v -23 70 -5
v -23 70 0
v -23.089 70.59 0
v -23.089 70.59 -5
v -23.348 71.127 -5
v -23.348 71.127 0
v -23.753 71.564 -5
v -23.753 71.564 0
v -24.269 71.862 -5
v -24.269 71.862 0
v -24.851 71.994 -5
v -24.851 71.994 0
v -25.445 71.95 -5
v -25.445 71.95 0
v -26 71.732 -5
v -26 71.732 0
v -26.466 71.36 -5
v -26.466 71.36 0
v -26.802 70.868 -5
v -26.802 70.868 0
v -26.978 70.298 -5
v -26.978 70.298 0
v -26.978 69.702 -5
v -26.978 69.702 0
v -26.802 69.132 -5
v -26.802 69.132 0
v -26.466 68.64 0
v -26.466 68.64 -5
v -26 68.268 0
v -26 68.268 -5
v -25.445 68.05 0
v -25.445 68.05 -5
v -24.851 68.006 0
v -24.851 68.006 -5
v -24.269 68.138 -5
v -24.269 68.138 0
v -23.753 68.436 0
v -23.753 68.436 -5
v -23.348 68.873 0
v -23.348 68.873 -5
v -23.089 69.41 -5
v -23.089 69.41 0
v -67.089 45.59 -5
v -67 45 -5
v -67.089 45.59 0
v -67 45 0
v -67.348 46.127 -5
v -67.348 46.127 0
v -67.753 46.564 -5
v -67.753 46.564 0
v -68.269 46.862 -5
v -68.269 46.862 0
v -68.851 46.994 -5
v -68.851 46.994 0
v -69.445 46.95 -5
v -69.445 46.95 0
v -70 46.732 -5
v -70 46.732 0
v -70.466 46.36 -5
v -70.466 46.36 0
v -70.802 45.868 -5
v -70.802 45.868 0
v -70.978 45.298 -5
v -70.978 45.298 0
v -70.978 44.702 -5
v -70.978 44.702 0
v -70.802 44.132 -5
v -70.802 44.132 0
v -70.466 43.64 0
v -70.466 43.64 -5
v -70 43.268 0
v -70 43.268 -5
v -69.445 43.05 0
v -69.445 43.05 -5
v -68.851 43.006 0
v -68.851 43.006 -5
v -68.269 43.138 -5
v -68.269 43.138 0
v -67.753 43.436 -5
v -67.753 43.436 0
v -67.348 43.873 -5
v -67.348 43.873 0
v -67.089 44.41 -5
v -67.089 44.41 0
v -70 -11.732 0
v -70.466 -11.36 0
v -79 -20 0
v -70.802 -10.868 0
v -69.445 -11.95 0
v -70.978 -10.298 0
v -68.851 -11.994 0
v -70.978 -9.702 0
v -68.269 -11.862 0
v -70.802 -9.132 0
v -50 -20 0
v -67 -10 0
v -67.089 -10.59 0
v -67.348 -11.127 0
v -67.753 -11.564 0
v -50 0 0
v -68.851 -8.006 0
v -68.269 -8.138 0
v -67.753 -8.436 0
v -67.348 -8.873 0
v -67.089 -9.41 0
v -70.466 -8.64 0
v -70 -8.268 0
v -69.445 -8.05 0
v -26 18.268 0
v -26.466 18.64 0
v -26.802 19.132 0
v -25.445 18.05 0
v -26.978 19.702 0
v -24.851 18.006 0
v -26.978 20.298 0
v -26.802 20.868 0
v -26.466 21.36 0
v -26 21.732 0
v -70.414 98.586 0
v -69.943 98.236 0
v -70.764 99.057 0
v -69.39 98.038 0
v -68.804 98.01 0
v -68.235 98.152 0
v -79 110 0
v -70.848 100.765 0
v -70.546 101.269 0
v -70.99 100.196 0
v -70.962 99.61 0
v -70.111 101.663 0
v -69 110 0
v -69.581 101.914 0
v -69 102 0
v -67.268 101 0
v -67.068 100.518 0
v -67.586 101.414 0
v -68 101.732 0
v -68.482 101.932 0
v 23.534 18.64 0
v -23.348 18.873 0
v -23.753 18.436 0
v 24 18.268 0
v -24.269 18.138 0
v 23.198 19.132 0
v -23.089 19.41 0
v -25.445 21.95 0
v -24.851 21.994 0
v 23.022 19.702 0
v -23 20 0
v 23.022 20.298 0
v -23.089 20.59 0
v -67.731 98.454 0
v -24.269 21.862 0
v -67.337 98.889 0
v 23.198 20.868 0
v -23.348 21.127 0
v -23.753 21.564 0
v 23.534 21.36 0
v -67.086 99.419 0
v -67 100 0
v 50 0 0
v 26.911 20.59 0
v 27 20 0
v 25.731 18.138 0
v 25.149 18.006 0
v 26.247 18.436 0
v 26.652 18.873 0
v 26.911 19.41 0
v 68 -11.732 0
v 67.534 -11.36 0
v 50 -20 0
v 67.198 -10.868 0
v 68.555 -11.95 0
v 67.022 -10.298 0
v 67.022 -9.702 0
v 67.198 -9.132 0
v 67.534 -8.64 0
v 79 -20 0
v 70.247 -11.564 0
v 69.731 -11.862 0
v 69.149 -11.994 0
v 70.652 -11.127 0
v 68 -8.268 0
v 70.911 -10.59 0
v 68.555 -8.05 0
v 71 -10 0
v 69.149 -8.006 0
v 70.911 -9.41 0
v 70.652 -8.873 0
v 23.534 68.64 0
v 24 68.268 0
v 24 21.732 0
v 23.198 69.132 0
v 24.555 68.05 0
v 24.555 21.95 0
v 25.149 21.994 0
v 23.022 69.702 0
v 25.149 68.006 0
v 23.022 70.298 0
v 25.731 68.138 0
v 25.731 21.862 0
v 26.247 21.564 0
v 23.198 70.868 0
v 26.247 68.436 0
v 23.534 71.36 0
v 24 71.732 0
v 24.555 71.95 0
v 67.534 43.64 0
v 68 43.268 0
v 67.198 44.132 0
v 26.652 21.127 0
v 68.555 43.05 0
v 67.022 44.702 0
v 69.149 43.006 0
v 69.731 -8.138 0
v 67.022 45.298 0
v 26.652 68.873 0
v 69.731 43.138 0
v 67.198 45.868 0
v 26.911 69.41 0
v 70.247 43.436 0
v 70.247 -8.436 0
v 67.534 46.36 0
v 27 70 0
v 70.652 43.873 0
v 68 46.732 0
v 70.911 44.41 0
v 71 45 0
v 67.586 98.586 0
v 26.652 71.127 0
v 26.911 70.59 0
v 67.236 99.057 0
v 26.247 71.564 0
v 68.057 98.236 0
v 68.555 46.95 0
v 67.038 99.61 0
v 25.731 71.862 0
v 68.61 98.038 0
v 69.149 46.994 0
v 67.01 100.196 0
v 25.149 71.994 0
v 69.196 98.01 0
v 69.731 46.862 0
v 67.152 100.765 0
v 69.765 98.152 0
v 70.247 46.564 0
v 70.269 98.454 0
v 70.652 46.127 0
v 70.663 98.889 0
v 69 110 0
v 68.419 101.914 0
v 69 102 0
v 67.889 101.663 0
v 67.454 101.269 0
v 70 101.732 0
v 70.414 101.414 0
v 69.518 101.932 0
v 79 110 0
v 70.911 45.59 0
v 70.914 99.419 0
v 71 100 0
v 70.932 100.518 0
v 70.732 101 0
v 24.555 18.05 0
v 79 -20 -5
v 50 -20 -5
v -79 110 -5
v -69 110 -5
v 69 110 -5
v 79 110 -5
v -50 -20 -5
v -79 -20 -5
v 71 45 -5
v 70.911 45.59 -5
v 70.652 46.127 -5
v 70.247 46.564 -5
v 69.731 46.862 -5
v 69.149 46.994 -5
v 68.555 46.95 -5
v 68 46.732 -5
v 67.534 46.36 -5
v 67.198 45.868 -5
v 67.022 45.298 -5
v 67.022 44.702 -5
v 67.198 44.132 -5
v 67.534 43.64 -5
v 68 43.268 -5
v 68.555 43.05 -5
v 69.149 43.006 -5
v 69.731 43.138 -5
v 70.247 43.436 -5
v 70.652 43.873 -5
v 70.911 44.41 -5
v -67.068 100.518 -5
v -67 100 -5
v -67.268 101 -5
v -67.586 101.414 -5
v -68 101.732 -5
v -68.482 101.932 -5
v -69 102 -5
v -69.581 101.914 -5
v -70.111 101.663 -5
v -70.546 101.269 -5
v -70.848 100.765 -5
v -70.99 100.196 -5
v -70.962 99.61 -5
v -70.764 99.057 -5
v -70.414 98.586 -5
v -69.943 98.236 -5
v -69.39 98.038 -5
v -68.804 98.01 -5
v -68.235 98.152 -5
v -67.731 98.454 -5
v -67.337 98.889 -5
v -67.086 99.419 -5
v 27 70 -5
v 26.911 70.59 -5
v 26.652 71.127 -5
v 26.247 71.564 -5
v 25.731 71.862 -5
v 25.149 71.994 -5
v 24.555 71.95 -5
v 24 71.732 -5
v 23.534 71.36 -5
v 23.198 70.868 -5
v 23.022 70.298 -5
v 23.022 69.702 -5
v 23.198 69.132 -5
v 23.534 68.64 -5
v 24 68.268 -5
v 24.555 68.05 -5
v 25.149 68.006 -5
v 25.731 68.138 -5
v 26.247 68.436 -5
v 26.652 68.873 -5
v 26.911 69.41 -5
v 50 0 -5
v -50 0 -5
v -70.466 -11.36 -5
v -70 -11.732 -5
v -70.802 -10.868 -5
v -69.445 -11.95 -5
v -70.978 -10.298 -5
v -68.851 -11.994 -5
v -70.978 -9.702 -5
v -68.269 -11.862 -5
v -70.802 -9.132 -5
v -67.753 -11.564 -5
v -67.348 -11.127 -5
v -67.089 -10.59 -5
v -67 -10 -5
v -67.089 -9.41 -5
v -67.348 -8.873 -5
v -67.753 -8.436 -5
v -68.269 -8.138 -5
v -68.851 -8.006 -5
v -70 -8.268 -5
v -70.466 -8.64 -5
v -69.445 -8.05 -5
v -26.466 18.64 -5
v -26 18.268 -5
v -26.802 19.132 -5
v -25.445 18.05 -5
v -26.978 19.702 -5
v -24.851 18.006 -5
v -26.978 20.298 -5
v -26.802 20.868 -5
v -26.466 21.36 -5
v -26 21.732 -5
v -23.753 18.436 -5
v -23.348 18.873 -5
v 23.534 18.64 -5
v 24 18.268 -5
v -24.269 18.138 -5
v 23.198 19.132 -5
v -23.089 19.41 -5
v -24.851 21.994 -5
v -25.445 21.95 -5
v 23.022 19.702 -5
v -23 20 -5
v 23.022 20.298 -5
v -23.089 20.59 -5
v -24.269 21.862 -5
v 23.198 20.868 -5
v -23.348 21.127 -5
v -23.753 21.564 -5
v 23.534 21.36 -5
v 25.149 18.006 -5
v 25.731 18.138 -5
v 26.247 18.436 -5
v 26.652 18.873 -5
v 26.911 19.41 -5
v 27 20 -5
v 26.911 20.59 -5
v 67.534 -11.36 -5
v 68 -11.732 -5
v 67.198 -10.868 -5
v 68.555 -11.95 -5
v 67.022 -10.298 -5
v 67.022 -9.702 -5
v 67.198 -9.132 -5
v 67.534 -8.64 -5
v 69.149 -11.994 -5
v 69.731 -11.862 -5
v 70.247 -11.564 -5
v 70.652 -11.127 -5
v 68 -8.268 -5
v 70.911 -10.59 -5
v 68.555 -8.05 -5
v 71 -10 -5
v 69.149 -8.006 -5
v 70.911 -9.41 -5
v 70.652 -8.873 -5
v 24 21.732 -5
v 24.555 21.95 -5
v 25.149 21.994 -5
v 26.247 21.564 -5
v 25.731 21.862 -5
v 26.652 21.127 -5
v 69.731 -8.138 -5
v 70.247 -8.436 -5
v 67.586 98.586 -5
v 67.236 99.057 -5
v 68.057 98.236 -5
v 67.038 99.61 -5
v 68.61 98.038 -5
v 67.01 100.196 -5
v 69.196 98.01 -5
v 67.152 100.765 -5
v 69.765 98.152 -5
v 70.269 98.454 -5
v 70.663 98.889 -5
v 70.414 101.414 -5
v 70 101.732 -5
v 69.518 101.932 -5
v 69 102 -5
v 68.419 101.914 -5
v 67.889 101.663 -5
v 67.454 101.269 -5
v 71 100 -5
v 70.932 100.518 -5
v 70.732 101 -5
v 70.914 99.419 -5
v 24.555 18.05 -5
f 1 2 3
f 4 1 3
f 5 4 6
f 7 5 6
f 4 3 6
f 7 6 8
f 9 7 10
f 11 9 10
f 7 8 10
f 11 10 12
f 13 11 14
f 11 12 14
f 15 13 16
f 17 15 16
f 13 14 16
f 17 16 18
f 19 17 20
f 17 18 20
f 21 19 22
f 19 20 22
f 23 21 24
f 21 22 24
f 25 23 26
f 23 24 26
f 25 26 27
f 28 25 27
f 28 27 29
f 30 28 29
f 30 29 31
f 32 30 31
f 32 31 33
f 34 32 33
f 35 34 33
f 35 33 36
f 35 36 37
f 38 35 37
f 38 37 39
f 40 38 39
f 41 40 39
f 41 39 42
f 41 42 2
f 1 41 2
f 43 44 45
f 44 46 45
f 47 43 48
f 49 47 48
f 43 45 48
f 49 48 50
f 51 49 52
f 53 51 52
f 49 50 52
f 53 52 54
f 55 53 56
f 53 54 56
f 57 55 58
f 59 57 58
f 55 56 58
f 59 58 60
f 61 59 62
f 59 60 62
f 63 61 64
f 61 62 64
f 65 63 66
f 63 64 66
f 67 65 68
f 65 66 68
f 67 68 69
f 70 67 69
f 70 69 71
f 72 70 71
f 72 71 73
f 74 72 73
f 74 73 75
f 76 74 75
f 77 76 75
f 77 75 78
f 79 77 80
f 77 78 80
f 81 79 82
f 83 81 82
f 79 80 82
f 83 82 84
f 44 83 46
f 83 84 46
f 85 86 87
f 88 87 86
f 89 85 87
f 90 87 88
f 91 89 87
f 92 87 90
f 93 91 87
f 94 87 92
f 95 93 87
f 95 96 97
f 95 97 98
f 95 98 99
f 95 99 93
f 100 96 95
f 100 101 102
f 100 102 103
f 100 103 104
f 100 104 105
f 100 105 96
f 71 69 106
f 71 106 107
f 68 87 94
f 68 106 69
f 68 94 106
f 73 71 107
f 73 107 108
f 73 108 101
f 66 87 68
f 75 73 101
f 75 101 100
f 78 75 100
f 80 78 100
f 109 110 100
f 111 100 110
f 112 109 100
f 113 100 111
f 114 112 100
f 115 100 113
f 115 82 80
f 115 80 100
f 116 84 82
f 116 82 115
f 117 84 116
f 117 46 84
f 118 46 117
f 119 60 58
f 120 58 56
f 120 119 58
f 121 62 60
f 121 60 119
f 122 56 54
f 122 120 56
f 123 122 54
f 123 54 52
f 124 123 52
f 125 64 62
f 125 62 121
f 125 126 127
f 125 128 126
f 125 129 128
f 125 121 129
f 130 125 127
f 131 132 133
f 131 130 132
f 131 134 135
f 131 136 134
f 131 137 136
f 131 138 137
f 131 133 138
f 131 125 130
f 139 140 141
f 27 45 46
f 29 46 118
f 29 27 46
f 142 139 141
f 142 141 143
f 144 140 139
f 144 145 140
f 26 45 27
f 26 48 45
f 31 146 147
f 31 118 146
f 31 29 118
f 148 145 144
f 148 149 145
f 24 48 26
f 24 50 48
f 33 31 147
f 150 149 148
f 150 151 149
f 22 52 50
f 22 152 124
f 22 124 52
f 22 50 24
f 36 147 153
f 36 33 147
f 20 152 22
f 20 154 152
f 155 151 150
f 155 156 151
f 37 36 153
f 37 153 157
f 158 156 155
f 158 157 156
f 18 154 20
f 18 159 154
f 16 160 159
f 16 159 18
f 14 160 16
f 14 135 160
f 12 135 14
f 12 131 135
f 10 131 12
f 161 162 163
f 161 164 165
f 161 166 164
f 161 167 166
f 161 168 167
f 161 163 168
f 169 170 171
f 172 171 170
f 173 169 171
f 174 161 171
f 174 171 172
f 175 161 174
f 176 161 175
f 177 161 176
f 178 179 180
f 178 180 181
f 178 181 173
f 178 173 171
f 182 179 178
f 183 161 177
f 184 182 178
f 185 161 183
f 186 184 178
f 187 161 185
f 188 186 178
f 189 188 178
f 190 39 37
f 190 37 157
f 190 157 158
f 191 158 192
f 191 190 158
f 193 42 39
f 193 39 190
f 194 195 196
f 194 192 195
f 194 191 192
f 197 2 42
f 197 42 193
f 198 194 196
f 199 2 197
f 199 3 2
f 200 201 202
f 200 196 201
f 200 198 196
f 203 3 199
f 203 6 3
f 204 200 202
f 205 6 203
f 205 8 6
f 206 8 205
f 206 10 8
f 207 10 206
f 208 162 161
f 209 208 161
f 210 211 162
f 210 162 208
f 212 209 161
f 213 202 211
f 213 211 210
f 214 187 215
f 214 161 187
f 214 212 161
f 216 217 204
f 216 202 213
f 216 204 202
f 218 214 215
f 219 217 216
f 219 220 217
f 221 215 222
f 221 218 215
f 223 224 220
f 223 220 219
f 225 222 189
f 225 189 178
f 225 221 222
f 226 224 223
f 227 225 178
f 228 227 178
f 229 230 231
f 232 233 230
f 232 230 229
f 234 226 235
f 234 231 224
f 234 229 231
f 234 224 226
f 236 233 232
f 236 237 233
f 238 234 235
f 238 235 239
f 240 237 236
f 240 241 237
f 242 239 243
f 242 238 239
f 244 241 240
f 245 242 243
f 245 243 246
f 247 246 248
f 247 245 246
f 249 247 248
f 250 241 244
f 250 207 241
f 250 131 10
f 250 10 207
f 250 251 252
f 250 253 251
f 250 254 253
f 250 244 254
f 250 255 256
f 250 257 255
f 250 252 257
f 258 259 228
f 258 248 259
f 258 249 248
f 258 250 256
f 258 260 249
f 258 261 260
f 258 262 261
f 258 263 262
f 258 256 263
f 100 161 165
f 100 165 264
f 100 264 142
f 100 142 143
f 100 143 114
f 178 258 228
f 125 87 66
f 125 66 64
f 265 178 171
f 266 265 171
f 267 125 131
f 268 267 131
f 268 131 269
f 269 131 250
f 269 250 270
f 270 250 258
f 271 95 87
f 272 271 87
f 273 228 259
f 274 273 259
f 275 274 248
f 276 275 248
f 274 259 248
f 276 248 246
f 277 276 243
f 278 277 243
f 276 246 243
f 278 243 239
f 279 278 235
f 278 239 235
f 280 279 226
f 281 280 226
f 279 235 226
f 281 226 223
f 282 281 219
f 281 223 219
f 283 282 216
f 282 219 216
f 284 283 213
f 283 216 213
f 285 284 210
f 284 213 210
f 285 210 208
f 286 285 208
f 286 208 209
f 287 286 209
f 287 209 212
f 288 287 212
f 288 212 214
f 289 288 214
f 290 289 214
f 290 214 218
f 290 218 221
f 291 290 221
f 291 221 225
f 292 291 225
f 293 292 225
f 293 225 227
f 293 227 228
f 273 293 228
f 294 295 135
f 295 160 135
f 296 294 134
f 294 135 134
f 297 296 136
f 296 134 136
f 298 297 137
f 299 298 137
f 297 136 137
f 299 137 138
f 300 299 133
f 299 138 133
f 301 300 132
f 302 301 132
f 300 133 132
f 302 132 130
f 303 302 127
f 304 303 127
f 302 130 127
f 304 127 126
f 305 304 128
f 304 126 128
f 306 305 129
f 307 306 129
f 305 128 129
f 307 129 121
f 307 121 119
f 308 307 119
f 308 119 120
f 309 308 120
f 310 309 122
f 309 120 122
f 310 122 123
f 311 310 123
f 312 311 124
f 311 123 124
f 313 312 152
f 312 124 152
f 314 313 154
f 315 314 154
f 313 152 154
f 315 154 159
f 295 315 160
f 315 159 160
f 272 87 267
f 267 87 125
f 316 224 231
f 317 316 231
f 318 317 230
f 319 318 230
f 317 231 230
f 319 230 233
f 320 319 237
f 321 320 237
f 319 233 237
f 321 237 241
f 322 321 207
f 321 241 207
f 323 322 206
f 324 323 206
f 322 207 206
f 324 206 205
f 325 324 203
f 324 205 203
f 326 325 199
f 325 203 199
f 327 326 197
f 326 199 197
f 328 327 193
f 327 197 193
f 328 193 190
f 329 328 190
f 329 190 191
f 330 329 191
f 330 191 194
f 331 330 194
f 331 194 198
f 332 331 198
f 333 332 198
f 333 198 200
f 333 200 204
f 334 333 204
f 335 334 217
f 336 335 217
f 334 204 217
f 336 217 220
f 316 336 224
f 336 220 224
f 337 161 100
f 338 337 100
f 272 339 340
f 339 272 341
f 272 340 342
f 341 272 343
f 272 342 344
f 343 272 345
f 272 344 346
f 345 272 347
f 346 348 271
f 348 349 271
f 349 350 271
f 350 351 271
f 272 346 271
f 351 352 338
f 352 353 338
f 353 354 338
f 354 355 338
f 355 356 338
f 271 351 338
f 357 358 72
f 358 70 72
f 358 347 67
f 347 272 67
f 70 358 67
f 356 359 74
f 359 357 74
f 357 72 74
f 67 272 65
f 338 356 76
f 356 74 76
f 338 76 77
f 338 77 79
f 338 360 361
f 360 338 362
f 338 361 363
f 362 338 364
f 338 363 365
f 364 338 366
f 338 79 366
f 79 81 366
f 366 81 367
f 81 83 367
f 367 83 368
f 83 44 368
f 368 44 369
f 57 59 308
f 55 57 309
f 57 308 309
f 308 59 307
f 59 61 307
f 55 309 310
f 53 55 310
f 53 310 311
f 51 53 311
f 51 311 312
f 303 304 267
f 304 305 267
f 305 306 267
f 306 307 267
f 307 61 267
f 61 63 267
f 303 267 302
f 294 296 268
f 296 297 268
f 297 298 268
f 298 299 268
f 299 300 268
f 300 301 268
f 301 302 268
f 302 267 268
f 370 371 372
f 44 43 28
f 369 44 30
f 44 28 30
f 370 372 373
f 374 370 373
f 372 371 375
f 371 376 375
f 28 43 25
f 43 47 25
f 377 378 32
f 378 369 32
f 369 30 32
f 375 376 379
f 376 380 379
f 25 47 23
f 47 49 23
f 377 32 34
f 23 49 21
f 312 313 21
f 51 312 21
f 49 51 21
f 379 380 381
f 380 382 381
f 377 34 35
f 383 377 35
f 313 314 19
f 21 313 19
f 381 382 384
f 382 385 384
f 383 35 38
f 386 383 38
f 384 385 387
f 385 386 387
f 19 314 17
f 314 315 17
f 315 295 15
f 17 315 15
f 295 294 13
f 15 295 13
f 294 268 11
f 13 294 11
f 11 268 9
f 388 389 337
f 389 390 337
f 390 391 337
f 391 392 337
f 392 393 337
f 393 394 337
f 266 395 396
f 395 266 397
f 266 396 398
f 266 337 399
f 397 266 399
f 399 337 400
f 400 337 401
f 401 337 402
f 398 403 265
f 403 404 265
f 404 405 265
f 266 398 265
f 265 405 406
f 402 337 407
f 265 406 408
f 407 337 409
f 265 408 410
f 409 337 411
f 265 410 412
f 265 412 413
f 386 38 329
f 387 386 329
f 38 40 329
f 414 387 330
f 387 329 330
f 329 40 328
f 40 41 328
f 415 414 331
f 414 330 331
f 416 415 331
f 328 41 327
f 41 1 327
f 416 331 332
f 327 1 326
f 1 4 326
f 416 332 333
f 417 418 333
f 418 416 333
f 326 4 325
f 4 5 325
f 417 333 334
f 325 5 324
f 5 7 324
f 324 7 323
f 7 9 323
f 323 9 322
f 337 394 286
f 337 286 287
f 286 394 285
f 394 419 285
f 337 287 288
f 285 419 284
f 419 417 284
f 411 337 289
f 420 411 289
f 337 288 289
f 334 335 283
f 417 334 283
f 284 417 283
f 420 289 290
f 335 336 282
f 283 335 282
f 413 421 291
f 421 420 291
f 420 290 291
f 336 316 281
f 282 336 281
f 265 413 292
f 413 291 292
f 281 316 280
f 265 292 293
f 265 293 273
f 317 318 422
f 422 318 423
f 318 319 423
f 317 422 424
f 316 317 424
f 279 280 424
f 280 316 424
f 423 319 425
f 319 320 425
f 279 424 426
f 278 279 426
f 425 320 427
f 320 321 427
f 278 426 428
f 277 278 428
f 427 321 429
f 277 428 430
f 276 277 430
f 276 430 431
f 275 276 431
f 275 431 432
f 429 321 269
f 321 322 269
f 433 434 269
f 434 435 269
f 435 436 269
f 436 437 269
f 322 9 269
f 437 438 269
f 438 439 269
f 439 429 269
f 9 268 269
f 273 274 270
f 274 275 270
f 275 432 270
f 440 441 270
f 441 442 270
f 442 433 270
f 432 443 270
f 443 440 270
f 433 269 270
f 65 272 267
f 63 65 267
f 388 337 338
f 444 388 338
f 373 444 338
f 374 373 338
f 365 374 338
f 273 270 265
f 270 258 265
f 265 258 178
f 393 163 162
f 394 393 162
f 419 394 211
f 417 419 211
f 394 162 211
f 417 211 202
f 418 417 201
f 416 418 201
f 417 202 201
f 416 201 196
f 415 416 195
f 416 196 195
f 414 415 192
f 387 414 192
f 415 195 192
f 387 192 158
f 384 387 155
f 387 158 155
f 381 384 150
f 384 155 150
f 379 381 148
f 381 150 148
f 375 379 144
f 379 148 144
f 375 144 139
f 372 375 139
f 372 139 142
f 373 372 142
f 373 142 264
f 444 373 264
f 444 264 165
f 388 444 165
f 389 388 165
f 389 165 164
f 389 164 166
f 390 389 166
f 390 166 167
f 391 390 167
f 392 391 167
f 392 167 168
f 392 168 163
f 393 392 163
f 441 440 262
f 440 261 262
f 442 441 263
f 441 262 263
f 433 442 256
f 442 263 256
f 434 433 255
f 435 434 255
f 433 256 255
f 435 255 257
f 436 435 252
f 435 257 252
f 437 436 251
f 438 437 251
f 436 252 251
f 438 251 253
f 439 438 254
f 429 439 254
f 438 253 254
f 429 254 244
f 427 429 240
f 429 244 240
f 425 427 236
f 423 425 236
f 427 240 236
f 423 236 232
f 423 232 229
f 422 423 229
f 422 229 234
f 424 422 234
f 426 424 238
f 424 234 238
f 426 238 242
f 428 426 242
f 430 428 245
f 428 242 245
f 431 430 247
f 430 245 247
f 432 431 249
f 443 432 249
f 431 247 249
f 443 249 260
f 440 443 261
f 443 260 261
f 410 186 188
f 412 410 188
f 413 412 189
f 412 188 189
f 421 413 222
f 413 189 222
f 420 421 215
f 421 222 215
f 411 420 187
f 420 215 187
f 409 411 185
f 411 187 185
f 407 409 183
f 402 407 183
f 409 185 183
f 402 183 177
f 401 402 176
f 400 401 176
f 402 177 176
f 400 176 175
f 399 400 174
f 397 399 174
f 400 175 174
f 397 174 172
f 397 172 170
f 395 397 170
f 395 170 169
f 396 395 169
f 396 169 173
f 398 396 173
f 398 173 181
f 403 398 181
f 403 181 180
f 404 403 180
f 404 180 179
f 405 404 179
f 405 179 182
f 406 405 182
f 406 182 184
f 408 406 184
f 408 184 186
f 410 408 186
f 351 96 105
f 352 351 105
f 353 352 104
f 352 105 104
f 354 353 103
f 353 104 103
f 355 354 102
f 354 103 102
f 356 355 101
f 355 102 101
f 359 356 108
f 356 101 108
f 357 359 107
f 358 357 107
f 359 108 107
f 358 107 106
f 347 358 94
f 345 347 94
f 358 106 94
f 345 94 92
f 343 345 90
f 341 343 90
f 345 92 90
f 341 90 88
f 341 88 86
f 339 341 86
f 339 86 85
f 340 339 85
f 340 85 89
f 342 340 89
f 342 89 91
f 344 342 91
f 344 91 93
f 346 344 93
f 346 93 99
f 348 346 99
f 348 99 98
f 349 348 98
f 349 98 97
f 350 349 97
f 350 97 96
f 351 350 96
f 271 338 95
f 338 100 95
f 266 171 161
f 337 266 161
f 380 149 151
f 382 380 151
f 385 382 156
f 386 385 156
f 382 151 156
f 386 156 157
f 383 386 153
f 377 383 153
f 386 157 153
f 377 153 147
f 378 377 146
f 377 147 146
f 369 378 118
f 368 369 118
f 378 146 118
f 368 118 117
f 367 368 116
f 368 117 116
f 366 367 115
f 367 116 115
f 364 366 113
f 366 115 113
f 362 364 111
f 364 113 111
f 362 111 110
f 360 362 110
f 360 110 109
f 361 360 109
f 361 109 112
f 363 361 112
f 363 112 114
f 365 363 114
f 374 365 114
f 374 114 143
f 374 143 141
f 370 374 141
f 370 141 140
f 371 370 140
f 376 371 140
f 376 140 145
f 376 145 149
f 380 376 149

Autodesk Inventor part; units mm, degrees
ref_plane "YZ Plane" through (0, 0, 0) normal (1, 0, 0) x (0, 1, 0)
ref_plane "XZ Plane" through (0, 0, 0) normal (0, 1, 0) x (-1, 0, 0)
ref_plane "XY Plane" through (0, 0, 0) normal (0, 0, 1) x (1, 0, 0)
sketch "Esquisse1" plane through (0, 0, 0) normal (0, 0, 1) x (1, 0, 0)
  line L0 (0, 0) -> (-50, 0)
  line L1 (-50, 0) -> (-50, -20)
  line L2 (-50, -20) -> (-79, -20)
  line L3 (-79, -20) -> (-79, 110)
  line L4 (-79, 110) -> (79, 110)
  line L5 (79, 110) -> (79, -20)
  line L6 (79, -20) -> (50, -20)
  line L7 (50, -20) -> (50, 0)
  line L8 (50, 0) -> (0, 0)
  line L9 (-69, 110) -> (-69, 100)
  line L10 (-69, 100) -> (-69, 45) construction
  line L11 (-69, 45) -> (-69, -10) construction
  line L12 (-69, -10) -> (-69, -20)
  line L13 (69, -20) -> (69, -10)
  line L14 (69, -10) -> (69, 45) construction
  line L15 (69, 45) -> (69, 100) construction
  line L16 (69, 100) -> (69, 110)
  circle A0 centre (-69, 100) radius 2
  circle A1 centre (69, 100) radius 2
  circle A2 centre (69, 45) radius 2
  circle A3 centre (-69, 45) radius 2
  circle A4 centre (-69, -10) radius 2
  circle A5 centre (69, -10) radius 2
  line L17 (-69, -10) -> (-79, -10)
  line L18 (69, -10) -> (79, -10)
  line L19 (25, 70) -> (-25, 70) construction
  line L20 (-25, 70) -> (-25, 20) construction
  line L21 (-25, 20) -> (25, 20) construction
  line L22 (25, 20) -> (25, 70) construction
  line L23 (25, 70) -> (-25, 20) construction
  line L24 (-25, 70) -> (25, 20) construction
  line L25 (-69, 45) -> (69, 45) construction
  circle A6 centre (-25, 70) radius 2
  circle A7 centre (25, 70) radius 2
  circle A8 centre (25, 20) radius 2
  circle A9 centre (-25, 20) radius 2
  point P0 (0, 45)
  dimension "d0" = 130
  dimension "d1" = 110
  dimension "d2" = 100
  dimension "d3" = 158
  dimension "d4" = 10
  dimension "d5" = 4
  dimension "d8" = 4
  dimension "d9" = 50
  dimension "d10" = 50
extrude "Extrusion1" add sketch "Esquisse1" against normal blind 5 contours L0 L1 L2 L12 A4 L17 L3 L4 L5 L18 A5 L13 L6 L7 L8 | L2 L3 L17 A4 L12 | L13 A5 L18 L5 L6
properties part number "Plaque avant"
